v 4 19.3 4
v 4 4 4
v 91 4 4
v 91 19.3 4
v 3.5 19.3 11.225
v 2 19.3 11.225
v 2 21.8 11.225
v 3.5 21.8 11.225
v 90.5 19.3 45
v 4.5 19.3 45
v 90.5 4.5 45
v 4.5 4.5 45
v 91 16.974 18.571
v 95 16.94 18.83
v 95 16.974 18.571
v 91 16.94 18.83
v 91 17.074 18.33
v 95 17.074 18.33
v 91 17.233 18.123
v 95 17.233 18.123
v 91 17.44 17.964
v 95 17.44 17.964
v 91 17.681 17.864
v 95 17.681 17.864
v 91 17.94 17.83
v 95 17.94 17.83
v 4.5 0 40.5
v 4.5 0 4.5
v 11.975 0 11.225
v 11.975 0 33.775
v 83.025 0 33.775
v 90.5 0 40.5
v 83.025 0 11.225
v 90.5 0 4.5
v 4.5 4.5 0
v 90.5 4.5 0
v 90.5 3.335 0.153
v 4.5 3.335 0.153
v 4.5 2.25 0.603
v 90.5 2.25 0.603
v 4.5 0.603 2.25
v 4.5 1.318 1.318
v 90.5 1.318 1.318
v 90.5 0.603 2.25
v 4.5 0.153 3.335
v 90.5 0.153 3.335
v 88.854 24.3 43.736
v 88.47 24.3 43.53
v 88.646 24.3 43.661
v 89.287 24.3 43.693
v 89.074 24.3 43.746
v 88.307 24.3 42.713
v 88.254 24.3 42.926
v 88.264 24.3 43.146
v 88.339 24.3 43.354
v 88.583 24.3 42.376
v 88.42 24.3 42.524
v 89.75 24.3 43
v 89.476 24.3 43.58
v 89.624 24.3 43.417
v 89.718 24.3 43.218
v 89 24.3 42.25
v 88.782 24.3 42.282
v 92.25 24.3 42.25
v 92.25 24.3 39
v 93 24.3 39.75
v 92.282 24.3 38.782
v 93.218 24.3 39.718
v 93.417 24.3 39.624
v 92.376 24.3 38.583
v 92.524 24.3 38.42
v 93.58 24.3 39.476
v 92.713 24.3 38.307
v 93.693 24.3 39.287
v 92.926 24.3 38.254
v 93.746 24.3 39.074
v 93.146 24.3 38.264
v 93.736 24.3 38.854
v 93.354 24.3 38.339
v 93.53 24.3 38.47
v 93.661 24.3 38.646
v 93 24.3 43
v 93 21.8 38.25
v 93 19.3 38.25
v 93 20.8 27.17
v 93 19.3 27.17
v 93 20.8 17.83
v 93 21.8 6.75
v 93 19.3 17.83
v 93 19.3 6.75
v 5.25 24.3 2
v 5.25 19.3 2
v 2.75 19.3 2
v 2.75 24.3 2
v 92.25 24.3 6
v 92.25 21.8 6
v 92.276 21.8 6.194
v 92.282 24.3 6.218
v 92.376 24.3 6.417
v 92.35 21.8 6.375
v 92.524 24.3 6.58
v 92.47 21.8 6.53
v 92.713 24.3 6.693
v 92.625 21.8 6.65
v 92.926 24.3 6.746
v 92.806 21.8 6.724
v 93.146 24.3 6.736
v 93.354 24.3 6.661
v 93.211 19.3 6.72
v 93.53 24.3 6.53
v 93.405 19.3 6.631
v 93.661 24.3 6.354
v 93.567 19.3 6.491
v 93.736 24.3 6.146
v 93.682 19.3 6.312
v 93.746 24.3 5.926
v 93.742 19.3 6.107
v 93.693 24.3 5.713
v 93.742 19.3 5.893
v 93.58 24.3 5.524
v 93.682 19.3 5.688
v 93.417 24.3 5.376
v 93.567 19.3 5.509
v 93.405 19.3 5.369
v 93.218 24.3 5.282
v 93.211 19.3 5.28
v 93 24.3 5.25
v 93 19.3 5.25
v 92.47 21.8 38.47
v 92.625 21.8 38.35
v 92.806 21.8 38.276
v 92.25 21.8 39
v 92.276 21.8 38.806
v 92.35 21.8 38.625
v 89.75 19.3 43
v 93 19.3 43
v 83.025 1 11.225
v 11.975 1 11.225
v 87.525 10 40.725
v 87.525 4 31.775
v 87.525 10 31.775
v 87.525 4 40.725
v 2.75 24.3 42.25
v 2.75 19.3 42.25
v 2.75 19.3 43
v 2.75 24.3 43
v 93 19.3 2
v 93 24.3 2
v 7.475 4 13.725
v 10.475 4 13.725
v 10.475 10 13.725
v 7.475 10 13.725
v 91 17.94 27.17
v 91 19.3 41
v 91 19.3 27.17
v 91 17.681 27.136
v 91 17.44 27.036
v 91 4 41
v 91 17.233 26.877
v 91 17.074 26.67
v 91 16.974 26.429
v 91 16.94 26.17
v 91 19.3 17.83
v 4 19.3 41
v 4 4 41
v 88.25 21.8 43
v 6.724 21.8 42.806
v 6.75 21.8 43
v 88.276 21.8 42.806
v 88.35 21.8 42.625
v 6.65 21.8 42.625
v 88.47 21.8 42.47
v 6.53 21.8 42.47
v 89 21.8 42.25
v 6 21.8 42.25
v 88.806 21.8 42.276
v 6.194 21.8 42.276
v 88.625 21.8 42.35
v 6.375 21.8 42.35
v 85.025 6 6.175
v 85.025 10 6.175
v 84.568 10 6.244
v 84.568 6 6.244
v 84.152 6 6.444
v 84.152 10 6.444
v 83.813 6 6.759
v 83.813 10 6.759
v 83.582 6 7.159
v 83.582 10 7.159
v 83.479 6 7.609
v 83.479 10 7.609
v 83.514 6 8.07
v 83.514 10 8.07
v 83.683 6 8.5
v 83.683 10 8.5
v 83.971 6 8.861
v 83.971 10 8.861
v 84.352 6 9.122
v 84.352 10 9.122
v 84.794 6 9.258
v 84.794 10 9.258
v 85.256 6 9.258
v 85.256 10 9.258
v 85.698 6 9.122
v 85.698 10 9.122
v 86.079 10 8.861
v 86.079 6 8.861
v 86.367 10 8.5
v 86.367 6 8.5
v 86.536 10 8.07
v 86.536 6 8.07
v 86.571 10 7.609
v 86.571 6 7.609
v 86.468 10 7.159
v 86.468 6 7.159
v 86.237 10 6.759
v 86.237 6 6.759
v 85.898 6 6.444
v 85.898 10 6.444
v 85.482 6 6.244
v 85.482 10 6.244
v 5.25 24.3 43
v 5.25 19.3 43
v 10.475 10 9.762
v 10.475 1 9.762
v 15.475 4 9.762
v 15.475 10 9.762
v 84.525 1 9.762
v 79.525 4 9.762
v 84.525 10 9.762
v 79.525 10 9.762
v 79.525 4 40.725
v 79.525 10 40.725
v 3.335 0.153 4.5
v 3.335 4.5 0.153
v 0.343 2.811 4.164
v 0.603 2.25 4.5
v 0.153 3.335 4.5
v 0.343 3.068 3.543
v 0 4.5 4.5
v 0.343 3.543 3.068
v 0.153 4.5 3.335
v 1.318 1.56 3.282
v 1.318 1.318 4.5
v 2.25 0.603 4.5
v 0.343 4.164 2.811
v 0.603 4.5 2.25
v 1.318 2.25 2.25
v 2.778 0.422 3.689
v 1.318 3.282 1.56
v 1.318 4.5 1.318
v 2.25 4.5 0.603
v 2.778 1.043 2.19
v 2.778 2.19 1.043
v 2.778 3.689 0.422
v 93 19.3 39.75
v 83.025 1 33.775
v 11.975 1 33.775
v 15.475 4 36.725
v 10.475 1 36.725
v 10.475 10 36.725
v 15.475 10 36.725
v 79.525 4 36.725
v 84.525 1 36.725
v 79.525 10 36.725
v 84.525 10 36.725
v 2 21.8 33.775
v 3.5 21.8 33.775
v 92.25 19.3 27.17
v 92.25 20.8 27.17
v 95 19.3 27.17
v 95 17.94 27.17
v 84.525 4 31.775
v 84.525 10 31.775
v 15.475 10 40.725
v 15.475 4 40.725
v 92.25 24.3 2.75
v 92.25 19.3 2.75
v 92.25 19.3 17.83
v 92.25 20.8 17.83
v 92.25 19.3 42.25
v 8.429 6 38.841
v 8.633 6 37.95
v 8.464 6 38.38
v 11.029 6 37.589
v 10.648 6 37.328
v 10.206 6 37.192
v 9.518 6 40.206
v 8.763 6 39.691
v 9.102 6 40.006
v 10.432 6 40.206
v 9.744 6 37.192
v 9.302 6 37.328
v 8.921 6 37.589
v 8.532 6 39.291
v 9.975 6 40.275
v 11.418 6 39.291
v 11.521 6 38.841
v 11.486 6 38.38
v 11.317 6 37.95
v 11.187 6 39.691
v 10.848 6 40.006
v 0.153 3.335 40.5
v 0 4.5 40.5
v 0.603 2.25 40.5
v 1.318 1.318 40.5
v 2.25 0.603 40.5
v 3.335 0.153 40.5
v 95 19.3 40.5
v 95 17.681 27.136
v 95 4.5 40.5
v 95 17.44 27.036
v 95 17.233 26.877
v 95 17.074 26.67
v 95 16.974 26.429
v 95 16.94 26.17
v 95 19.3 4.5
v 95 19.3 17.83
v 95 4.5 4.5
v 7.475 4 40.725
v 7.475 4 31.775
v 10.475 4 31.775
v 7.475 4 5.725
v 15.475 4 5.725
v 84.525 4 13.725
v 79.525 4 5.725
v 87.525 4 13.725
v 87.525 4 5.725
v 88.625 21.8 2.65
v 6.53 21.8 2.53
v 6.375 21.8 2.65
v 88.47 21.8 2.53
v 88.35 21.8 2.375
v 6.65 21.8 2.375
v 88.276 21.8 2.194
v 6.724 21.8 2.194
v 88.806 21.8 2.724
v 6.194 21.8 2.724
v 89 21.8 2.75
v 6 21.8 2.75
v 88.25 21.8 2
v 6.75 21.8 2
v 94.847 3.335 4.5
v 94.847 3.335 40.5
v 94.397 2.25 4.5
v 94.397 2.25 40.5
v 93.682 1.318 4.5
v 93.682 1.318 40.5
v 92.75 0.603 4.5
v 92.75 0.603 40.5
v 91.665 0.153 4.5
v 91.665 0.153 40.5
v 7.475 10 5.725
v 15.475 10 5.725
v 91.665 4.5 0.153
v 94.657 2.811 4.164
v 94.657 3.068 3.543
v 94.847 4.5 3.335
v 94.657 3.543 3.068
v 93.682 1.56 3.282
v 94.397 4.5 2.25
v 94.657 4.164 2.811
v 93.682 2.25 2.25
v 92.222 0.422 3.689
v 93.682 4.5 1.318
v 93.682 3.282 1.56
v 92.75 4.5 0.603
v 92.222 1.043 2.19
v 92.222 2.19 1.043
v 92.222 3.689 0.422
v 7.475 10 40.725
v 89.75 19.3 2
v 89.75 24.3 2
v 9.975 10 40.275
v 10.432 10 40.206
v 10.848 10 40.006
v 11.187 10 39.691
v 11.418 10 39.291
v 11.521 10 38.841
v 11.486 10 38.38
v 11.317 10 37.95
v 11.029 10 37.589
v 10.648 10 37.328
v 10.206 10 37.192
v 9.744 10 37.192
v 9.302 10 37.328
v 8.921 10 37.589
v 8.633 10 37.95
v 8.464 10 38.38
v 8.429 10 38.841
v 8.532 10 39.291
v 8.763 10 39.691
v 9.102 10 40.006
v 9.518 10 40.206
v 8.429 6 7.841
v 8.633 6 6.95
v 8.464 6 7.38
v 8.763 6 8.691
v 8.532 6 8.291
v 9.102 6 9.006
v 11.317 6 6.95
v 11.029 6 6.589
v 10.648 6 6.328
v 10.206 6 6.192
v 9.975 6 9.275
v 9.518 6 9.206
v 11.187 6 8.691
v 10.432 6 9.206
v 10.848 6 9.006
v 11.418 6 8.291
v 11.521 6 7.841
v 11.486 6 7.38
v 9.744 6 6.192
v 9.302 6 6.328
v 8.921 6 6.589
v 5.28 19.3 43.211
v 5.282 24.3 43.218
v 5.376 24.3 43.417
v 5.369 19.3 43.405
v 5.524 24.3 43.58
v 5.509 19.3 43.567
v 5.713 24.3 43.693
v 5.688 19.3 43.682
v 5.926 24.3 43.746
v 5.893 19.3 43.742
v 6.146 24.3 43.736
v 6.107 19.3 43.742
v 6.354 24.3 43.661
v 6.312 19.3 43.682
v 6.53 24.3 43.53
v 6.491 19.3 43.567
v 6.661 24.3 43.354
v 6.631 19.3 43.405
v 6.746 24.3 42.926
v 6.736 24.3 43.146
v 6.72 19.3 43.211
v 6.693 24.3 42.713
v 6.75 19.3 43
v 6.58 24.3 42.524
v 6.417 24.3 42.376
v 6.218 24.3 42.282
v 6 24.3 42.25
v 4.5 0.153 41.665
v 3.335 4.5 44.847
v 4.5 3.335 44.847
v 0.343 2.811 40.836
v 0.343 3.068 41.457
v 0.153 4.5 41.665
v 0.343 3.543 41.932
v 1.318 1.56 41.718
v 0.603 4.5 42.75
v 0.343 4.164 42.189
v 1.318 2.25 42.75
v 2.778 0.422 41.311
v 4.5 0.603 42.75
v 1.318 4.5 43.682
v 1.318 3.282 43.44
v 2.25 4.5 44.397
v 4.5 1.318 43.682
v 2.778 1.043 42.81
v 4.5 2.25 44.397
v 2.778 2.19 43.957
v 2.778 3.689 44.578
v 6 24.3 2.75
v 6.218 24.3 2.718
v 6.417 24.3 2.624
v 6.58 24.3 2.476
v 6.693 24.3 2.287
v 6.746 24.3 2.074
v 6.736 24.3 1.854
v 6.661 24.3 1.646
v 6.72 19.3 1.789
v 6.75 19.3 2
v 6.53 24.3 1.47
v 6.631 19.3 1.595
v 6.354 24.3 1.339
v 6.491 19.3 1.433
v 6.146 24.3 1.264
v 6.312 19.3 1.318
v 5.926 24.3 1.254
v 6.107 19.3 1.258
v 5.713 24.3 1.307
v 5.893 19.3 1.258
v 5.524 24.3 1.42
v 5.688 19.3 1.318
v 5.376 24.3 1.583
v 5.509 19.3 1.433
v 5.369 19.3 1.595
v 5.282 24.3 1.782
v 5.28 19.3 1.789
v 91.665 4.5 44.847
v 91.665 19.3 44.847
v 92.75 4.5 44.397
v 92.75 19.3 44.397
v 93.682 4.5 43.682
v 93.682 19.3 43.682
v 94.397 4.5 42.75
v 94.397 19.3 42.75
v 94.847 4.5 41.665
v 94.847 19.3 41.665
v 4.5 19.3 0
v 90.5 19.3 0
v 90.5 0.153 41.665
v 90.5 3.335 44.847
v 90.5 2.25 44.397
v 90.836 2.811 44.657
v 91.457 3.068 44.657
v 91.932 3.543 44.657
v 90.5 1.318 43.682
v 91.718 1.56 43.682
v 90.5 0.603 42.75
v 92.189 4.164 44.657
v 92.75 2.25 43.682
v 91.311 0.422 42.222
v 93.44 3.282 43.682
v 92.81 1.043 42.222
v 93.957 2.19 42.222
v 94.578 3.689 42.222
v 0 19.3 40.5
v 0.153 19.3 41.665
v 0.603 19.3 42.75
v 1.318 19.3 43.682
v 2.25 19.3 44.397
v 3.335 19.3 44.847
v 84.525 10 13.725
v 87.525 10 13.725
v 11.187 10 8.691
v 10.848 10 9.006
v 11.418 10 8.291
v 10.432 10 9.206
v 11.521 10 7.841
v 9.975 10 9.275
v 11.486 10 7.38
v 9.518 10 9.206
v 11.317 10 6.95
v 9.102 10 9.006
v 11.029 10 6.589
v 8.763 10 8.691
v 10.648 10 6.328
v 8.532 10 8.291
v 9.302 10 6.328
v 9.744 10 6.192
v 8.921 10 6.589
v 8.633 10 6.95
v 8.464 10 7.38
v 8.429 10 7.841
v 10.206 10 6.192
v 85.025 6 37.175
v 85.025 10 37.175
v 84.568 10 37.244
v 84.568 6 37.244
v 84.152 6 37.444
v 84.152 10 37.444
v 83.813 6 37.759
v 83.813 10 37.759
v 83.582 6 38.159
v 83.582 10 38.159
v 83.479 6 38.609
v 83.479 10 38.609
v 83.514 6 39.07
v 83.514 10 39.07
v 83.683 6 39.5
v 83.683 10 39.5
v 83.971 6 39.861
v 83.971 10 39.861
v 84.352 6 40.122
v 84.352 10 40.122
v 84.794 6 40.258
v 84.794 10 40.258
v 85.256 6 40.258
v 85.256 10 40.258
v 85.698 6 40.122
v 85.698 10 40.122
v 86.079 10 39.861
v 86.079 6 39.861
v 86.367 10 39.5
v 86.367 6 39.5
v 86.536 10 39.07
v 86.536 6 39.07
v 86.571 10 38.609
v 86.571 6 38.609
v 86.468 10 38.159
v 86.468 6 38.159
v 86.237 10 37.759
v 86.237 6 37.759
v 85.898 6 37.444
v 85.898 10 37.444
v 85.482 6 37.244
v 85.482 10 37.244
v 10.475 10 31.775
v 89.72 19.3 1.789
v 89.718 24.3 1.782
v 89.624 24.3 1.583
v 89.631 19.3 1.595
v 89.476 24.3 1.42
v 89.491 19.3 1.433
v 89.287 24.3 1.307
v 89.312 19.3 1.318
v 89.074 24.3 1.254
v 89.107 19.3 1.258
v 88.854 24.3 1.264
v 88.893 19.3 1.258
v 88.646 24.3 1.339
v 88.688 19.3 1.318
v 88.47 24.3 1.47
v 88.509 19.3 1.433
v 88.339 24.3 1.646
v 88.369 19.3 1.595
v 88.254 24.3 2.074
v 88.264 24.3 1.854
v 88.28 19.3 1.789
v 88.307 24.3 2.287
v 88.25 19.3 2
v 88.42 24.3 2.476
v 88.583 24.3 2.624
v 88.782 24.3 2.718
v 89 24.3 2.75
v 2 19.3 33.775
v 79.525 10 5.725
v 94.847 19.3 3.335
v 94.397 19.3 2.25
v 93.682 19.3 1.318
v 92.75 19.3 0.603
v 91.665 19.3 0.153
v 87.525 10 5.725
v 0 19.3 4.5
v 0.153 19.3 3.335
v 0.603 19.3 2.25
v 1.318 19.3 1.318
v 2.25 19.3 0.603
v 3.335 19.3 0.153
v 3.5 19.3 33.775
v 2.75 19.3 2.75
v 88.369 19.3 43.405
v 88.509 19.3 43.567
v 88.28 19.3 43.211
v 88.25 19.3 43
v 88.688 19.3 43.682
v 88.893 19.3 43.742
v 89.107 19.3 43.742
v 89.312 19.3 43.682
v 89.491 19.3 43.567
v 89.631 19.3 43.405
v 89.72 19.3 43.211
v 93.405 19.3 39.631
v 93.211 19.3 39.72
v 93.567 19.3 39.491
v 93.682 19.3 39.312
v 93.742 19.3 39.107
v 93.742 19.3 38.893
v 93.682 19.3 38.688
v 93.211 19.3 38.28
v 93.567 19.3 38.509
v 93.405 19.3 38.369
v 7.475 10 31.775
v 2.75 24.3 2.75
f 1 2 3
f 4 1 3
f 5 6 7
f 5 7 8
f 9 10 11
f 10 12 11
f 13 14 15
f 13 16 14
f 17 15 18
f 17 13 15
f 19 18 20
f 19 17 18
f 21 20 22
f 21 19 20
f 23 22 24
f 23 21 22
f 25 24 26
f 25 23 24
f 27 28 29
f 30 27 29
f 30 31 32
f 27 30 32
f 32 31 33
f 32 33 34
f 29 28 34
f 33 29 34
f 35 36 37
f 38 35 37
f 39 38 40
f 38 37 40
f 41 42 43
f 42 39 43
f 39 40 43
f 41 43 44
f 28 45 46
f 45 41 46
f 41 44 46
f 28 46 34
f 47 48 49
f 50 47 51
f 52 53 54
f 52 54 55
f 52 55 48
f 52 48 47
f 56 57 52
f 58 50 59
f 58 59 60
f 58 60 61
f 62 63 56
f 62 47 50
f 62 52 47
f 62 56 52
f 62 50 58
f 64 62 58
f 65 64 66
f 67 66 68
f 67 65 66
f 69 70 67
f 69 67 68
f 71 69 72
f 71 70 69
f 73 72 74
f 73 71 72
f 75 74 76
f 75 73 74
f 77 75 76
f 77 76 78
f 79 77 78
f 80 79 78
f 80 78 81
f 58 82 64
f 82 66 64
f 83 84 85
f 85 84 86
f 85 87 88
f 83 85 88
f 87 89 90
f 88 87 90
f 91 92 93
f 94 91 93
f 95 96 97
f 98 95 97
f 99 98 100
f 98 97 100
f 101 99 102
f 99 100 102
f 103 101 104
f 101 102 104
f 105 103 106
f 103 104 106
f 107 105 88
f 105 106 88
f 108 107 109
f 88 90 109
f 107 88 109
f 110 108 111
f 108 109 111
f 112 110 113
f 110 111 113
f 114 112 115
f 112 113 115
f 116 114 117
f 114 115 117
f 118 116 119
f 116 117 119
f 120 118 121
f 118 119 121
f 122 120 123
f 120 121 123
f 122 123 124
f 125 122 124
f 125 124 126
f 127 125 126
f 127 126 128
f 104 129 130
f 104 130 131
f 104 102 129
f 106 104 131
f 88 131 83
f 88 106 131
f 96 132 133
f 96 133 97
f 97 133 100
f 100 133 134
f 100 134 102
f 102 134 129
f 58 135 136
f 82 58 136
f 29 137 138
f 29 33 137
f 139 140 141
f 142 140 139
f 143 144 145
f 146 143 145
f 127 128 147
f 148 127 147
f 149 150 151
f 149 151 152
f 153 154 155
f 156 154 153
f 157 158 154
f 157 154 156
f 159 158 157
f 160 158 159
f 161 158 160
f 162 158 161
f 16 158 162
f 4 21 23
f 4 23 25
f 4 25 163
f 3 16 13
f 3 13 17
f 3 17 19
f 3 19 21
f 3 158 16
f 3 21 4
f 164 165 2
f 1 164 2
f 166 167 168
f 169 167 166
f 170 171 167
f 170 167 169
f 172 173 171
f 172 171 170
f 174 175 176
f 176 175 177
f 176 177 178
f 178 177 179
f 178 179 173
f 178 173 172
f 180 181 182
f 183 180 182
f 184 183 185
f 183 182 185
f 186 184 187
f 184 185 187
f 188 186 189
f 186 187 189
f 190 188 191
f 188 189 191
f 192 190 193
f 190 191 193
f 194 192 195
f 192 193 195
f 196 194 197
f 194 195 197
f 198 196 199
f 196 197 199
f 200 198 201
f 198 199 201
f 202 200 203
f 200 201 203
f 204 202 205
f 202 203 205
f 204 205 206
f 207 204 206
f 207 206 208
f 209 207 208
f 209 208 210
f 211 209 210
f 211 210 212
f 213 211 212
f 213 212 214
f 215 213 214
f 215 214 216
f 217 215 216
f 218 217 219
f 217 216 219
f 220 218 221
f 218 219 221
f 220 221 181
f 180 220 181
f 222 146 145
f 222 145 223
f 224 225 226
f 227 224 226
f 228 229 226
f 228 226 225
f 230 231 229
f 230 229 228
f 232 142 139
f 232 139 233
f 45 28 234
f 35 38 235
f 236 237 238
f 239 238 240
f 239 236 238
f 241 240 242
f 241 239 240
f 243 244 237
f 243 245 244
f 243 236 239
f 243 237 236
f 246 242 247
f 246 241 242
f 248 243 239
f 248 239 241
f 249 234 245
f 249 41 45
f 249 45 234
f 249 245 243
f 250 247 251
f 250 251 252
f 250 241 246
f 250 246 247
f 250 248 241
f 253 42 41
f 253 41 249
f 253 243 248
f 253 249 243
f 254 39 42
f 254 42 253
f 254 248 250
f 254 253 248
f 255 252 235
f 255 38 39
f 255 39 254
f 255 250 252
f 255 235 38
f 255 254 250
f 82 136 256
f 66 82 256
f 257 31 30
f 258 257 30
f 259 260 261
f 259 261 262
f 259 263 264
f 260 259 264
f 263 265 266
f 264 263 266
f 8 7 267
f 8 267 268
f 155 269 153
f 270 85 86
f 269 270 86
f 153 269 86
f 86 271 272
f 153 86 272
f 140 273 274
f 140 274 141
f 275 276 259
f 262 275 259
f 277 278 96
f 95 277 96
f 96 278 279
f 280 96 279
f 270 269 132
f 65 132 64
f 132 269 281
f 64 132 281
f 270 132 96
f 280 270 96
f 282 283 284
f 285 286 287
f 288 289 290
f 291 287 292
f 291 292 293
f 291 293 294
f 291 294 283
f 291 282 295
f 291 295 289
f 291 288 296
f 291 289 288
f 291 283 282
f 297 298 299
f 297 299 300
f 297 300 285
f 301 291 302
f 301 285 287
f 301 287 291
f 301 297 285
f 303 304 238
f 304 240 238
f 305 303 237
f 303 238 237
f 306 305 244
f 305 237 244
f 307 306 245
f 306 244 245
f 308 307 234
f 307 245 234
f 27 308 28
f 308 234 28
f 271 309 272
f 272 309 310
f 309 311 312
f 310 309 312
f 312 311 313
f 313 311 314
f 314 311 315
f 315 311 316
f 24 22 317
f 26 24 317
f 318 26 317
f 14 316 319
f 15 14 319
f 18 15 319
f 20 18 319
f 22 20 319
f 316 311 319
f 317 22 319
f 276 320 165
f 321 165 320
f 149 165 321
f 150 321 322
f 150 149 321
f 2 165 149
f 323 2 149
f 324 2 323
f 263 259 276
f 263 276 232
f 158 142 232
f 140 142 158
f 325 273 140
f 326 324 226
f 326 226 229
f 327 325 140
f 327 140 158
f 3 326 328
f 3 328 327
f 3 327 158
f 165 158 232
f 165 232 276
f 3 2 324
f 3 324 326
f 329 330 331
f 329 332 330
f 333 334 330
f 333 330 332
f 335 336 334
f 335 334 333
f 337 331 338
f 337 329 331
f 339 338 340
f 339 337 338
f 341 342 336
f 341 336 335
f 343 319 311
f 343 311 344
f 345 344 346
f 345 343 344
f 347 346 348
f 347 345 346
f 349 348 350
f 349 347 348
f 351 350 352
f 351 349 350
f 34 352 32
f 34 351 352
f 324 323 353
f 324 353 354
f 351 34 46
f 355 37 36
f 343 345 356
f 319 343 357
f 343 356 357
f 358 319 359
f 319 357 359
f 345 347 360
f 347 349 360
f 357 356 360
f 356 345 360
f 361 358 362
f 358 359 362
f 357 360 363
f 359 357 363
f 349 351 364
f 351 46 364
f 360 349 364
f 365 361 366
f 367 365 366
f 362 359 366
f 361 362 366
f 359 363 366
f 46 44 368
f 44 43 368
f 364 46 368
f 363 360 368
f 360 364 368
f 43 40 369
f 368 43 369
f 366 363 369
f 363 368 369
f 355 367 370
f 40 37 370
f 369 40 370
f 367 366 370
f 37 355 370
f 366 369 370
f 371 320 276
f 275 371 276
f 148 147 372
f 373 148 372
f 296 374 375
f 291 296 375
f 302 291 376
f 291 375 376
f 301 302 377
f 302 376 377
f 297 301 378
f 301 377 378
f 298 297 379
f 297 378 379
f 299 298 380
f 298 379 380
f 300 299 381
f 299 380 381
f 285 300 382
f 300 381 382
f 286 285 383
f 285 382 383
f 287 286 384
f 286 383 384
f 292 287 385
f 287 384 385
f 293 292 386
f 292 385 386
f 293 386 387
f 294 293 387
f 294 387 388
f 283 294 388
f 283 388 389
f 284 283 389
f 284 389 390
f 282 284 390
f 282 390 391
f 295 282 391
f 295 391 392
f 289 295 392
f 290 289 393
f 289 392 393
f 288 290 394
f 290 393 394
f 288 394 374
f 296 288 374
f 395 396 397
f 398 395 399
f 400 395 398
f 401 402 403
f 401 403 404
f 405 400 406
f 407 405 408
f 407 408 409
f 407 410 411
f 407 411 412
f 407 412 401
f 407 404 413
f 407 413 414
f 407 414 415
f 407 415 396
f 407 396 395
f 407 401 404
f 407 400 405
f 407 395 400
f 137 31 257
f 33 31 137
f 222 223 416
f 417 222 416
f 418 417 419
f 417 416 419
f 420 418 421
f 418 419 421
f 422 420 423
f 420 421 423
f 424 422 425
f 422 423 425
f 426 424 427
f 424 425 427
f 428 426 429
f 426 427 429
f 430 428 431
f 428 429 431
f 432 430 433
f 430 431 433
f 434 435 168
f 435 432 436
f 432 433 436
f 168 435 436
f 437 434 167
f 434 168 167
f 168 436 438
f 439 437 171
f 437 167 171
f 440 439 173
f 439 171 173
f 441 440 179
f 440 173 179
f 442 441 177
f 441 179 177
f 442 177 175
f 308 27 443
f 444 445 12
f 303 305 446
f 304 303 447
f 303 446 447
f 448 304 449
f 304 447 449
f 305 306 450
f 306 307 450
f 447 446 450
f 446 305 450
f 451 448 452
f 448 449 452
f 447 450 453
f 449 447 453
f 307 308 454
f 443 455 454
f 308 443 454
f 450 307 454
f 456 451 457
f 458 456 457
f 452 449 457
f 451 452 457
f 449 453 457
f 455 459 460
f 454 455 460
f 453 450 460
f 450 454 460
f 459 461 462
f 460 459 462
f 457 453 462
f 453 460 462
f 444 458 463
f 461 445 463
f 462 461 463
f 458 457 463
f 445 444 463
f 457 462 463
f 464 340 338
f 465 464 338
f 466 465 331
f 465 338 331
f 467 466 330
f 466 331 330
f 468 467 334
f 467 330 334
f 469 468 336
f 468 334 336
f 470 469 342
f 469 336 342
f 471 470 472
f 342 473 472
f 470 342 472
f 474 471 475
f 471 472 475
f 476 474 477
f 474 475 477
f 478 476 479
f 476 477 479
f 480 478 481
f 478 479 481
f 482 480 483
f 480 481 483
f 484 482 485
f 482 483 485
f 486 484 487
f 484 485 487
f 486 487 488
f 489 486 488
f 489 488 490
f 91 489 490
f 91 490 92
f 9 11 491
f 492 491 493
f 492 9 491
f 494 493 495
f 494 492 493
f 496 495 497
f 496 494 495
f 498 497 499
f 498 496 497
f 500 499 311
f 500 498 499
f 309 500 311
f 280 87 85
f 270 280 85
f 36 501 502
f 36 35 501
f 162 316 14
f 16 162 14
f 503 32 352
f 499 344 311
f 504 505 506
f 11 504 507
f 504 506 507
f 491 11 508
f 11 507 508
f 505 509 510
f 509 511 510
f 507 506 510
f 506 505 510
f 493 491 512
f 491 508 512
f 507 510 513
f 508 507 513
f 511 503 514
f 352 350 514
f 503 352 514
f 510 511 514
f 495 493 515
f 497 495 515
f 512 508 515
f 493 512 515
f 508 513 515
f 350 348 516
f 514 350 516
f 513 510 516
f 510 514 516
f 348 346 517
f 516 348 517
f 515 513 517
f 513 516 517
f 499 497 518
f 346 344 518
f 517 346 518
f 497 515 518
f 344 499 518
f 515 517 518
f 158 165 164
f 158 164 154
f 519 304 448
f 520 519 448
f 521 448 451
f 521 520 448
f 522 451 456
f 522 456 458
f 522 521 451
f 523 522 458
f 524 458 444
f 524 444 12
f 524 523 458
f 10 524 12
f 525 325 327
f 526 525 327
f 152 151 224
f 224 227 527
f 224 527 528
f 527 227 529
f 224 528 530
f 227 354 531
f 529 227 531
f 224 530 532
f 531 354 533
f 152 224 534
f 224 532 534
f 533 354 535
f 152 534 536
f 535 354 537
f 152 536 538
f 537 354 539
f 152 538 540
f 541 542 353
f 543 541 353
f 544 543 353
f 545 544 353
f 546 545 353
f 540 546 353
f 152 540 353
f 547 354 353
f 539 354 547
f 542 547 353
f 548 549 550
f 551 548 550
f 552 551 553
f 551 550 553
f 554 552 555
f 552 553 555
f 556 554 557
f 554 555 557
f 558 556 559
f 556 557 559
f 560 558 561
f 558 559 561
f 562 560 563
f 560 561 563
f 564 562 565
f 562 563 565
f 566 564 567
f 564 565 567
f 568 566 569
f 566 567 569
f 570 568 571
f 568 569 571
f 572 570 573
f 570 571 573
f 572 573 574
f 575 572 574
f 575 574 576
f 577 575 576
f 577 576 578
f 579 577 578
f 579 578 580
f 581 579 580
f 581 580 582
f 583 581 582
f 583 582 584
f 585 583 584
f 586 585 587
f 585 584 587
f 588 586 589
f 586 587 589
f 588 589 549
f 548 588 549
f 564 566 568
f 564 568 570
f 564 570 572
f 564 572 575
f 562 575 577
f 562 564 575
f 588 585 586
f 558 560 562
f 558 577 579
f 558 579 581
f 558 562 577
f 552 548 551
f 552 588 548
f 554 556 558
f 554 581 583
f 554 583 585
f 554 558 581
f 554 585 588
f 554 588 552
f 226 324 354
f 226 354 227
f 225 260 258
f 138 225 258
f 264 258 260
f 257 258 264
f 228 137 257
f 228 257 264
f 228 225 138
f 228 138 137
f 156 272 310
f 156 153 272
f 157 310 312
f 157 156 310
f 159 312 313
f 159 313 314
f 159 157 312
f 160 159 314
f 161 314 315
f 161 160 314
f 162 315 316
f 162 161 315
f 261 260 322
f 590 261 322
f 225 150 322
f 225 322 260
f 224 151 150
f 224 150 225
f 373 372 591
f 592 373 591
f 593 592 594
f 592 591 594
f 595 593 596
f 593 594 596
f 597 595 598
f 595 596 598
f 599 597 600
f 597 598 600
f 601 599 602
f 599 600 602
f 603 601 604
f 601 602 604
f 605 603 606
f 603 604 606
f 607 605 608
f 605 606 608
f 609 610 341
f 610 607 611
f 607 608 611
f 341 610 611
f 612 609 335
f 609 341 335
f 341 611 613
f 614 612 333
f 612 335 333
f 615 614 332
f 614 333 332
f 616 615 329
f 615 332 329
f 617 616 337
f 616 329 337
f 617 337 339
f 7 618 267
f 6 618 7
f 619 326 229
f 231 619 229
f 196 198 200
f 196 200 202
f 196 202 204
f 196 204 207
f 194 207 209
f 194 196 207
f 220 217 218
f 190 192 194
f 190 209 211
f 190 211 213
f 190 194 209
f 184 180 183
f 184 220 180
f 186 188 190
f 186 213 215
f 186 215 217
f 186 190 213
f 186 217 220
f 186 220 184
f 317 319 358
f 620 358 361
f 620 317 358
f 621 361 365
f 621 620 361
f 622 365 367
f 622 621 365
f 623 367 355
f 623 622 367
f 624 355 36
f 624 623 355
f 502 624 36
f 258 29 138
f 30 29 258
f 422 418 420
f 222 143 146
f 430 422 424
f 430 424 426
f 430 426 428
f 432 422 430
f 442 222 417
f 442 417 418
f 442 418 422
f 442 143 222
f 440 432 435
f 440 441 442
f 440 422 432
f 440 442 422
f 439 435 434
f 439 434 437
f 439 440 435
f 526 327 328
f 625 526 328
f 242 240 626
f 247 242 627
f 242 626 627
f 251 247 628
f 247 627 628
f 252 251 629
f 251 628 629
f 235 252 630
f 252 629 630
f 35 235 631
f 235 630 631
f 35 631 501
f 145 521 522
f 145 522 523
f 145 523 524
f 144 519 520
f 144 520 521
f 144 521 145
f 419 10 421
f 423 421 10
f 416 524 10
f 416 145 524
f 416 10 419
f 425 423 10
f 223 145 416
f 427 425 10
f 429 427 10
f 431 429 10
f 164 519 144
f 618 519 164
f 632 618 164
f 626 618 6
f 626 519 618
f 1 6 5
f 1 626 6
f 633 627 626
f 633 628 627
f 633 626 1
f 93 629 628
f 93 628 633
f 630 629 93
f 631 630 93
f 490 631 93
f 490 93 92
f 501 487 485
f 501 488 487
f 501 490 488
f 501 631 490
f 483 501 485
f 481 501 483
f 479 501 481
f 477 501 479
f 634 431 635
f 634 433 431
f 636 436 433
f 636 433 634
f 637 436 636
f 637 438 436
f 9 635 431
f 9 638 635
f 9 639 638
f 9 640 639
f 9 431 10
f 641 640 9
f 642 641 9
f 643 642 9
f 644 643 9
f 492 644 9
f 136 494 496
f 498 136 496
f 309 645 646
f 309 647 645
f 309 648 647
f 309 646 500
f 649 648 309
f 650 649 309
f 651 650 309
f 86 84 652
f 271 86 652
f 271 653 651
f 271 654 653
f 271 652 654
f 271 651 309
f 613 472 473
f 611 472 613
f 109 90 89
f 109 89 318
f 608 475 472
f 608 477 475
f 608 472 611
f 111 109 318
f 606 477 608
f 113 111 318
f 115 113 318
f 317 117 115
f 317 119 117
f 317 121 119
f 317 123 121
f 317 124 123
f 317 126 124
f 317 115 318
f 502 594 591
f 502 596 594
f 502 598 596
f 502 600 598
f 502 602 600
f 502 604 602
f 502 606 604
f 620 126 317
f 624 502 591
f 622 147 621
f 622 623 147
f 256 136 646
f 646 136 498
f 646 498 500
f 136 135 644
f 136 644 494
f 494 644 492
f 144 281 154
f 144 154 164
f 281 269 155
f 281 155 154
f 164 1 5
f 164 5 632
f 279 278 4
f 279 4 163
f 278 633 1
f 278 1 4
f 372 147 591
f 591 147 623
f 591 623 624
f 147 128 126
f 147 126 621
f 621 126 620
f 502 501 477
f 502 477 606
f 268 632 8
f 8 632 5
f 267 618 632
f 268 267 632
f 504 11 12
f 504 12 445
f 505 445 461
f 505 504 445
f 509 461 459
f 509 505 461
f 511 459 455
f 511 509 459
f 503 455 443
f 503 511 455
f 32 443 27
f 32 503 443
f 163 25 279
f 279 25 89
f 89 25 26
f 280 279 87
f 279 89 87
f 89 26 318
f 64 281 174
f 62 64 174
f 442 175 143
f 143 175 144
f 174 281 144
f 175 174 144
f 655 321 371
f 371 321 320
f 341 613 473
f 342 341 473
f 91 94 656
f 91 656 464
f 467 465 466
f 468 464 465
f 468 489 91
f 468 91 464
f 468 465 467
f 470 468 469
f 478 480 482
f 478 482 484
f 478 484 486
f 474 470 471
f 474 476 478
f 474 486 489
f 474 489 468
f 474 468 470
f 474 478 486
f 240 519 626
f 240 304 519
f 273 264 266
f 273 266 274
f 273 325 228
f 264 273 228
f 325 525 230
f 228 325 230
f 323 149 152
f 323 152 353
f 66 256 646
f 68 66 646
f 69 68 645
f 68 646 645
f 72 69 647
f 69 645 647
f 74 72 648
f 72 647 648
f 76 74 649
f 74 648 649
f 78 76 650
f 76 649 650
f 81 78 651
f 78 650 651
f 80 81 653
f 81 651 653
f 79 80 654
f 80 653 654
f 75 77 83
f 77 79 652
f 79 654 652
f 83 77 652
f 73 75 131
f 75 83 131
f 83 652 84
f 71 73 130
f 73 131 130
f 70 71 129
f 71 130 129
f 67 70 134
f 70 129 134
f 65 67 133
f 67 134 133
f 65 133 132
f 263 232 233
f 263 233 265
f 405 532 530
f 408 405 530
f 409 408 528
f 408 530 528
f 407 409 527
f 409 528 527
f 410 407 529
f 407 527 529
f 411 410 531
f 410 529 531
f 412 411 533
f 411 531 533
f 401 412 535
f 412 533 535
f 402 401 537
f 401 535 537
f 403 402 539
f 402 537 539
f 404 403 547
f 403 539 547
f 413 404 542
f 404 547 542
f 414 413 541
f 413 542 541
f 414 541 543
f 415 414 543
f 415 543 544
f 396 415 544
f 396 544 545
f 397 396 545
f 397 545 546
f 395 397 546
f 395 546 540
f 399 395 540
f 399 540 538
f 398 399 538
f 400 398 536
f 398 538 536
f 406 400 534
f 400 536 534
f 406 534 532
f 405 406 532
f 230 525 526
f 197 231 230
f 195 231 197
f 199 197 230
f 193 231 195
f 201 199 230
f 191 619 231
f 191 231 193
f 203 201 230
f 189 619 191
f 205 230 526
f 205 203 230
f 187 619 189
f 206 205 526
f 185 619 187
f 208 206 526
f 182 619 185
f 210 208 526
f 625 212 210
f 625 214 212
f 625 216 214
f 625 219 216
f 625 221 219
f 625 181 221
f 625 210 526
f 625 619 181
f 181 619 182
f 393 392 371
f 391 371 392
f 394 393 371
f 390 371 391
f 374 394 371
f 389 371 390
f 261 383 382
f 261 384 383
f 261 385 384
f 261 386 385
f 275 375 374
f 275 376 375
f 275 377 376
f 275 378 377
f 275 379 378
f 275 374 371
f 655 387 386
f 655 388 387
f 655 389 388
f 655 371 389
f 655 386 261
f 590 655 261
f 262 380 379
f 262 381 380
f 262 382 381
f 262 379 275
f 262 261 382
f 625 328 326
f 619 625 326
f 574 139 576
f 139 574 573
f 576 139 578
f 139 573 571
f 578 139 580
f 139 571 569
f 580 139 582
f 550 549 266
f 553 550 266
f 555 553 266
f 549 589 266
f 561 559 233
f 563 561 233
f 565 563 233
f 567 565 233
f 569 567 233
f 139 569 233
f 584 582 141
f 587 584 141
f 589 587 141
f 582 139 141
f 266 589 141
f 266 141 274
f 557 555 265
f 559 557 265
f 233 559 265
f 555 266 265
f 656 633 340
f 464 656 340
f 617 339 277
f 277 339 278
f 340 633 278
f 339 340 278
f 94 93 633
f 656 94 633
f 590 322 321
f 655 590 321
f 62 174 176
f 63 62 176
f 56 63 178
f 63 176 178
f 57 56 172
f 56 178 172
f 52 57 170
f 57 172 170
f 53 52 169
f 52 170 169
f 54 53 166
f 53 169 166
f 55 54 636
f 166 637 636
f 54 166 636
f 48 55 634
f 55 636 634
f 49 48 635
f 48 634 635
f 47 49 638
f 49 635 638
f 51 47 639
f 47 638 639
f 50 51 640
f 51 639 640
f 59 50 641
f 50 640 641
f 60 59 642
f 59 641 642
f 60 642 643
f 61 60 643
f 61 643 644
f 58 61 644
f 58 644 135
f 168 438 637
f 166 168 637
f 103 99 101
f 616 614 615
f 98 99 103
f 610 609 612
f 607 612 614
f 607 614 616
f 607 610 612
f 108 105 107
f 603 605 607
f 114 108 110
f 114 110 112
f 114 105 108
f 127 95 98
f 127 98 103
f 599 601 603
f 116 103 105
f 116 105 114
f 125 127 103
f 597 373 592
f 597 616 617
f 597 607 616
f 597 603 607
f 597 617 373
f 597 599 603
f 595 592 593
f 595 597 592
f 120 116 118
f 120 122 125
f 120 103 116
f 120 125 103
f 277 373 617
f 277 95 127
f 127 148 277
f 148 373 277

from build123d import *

# Parameters (mm, degrees)
SKETCH_1_W          = 95
SKETCH_1_H          = 45
EXTRUDE_1_DEPTH     = 19.3
SHELL_1_T           = -4
FILLET_1_R          = 4.5
SKETCH_2_W          = 71.05
SKETCH_2_H          = 22.55
CUT_EXTRUDE_1_DEPTH = 4.5
EXTRUDE_3_DEPTH     = 6
SKETCH_7_R          = 1.55
CUT_EXTRUDE_2_DEPTH = 4
EXTRUDE_5_DEPTH     = 5
EXTRUDE_6_DEPTH     = 2.5
SKETCH_9_W          = 1.5
SKETCH_9_H          = 22.55
EXTRUDE_7_DEPTH     = 2.5
SKETCH_10_W         = 74.05
SKETCH_10_H         = 26.962586992
CUT_EXTRUDE_3_DEPTH = 9
SKETCH_12_W         = 9.34
SKETCH_12_H         = 3.86
CUT_EXTRUDE_4_DEPTH = 24
FILLET_2_R          = 1
FILLET_3_R          = 1


with BuildPart() as part:
    # Эскиз1 → Бобышка-Вытянуть1 (new body)
    with BuildSketch(Plane(origin=(0, 0, 0), x_dir=(1, 0, 0), z_dir=(0, 1, 0))):
        with Locations((47.5, -22.5)):
            Rectangle(SKETCH_1_W, SKETCH_1_H)
    extrude(amount=EXTRUDE_1_DEPTH)

    # Оболочка1
    shell_1_openings = [part.faces().sort_by_distance(p)[0] for p in [
        (47.5, 19.3, 22.5),
    ]]
    offset(amount=SHELL_1_T, openings=shell_1_openings, kind=Kind.INTERSECTION)

    # Скругление1
    fillet_1_edges = [part.edges().sort_by_distance(p)[0] for p in [
        (47.5, 0, 45),
        (95, 0, 22.5),
        (47.5, 0, 0),
        (0, 0, 22.5),
        (95, 9.65, 0),
        (95, 9.65, 45),
        (0, 9.65, 0),
        (0, 9.65, 45),
    ]]
    fillet(fillet_1_edges, radius=FILLET_1_R)

    # Эскиз2 → Вырез-Вытянуть1 (cut)
    with BuildSketch(Plane(origin=(0, 0, 0), x_dir=(-1, 0, 0), z_dir=(0, -1, 0))):
        with Locations((-47.5, -22.5)):
            Rectangle(SKETCH_2_W, SKETCH_2_H)
    extrude(amount=-CUT_EXTRUDE_1_DEPTH, mode=Mode.SUBTRACT)

    # Эскиз6 → Бобышка-Вытянуть3 (add)
    with BuildSketch(Plane(origin=(0, 4, 0), x_dir=(1, 0, 0), z_dir=(0, 1, 0))):
        Polygon((11.975, -11.225), (11.975, -13.725), (7.475, -13.725), (7.475, -5.725), (15.475, -5.725), (15.475, -11.225), align=None)
        Polygon((11.975, -33.775), (11.975, -31.775), (7.475, -31.775), (7.475, -40.725), (15.475, -40.725), (15.475, -33.775), align=None)
        Polygon((87.525, -40.725), (79.525, -40.725), (79.525, -33.775), (83.025, -33.775), (83.025, -31.775), (87.525, -31.775), align=None)
        Polygon((79.525, -5.725), (79.525, -11.225), (83.025, -11.225), (83.025, -13.725), (87.525, -13.725), (87.525, -5.725), align=None)
    extrude(amount=EXTRUDE_3_DEPTH)

    # Эскиз7 → Вырез-Вытянуть2 (cut)
    with BuildSketch(Plane(origin=(0, 10, 0), x_dir=(1, 0, 0), z_dir=(0, 1, 0))):
        with Locations((9.975, -7.725)):
            Circle(SKETCH_7_R)
        with Locations((85.025, -7.725)):
            Circle(SKETCH_7_R)
        with Locations((9.975, -38.725)):
            Circle(SKETCH_7_R)
        with Locations((85.025, -38.725)):
            Circle(SKETCH_7_R)
    extrude(amount=-CUT_EXTRUDE_2_DEPTH, mode=Mode.SUBTRACT)

    # Эскиз8 → Бобышка-Вытянуть5 (add)
    with BuildSketch(Plane(origin=(0, 19.3, 0), x_dir=(1, 0, 0), z_dir=(0, 1, 0))):
        with BuildLine():
            Line((5.25, -2), (2.75, -2))
            Line((2.75, -2), (2.75, -2.75))
            Line((2.75, -2.75), (6, -2.75))
            ThreePointArc((6, -2.75), (6.530330086, -1.469669914), (5.25, -2))
        make_face()
        with BuildLine():
            Line((6, -42.25), (2.75, -42.25))
            Line((2.75, -42.25), (2.75, -43))
            Line((2.75, -43), (5.25, -43))
            ThreePointArc((5.25, -43), (6.530330086, -43.530330086), (6, -42.25))
        make_face()
        with BuildLine():
            Line((93, -2), (89.75, -2))
            ThreePointArc((89.75, -2), (88.469669914, -1.469669914), (89, -2.75))
            Line((89, -2.75), (92.25, -2.75))
            Line((92.25, -2.75), (92.25, -6))
            ThreePointArc((92.25, -6), (93.530330086, -6.530330086), (93, -5.25))
            Line((93, -5.25), (93, -2))
        make_face()
        with BuildLine():
            Line((92.25, -42.25), (89, -42.25))
            ThreePointArc((89, -42.25), (88.469669914, -43.530330086), (89.75, -43))
            Line((89.75, -43), (93, -43))
            Line((93, -43), (93, -39.75))
            ThreePointArc((93, -39.75), (93.530330086, -38.469669914), (92.25, -39))
            Line((92.25, -39), (92.25, -42.25))
        make_face()
    extrude(amount=EXTRUDE_5_DEPTH)

    # Эскиз8<4> → Бобышка-Вытянуть6 (add)
    with BuildSketch(Plane(origin=(0, 19.3, 0), x_dir=(1, 0, 0), z_dir=(0, 1, 0))):
        with BuildLine():
            ThreePointArc((6.75, -2), (6.530330086, -2.530330086), (6, -2.75))
            Line((6, -2.75), (89, -2.75))
            ThreePointArc((89, -2.75), (88.469669914, -2.530330086), (88.25, -2))
            Line((88.25, -2), (6.75, -2))
        make_face()
        with BuildLine():
            Line((89, -42.25), (6, -42.25))
            ThreePointArc((6, -42.25), (6.530330086, -42.469669914), (6.75, -43))
            Line((6.75, -43), (88.25, -43))
            ThreePointArc((88.25, -43), (88.469669914, -42.469669914), (89, -42.25))
        make_face()
        with BuildLine():
            ThreePointArc((93, -6.75), (92.469669914, -6.530330086), (92.25, -6))
            Line((92.25, -6), (92.25, -39))
            ThreePointArc((92.25, -39), (92.469669914, -38.469669914), (93, -38.25))
            Line((93, -38.25), (93, -6.75))
        make_face()
    extrude(amount=EXTRUDE_6_DEPTH)

    # Эскиз9 → Бобышка-Вытянуть7 (add)
    with BuildSketch(Plane(origin=(0, 19.3, 0), x_dir=(1, 0, 0), z_dir=(0, 1, 0))):
        with Locations((2.75, -22.5)):
            Rectangle(SKETCH_9_W, SKETCH_9_H)
    extrude(amount=EXTRUDE_7_DEPTH)

    # Эскиз10 → Вырез-Вытянуть3 (cut)
    with BuildSketch(Plane(origin=(0, 10, 0), x_dir=(1, 0, 0), z_dir=(0, 1, 0))):
        with Locations((47.5, -23.243706504)):
            Rectangle(SKETCH_10_W, SKETCH_10_H)
    extrude(amount=-CUT_EXTRUDE_3_DEPTH, mode=Mode.SUBTRACT)

    # Эскиз12 → Вырез-Вытянуть4 (cut)
    with BuildSketch(Plane(origin=(95, 0, 0), x_dir=(0, 0, -1), z_dir=(1, 0, 0))):
        with Locations((-22.5, 18.87)):
            Rectangle(SKETCH_12_W, SKETCH_12_H)
    extrude(amount=-CUT_EXTRUDE_4_DEPTH, mode=Mode.SUBTRACT)

    # Скругление2
    fillet_2_edges = [part.edges().sort_by_distance(p)[0] for p in [
        (93, 16.94, 27.17),
    ]]
    fillet(fillet_2_edges, radius=FILLET_2_R)

    # Скругление3
    fillet_3_edges = [part.edges().sort_by_distance(p)[0] for p in [
        (93, 16.94, 17.83),
    ]]
    fillet(fillet_3_edges, radius=FILLET_3_R)


solid = part.part
